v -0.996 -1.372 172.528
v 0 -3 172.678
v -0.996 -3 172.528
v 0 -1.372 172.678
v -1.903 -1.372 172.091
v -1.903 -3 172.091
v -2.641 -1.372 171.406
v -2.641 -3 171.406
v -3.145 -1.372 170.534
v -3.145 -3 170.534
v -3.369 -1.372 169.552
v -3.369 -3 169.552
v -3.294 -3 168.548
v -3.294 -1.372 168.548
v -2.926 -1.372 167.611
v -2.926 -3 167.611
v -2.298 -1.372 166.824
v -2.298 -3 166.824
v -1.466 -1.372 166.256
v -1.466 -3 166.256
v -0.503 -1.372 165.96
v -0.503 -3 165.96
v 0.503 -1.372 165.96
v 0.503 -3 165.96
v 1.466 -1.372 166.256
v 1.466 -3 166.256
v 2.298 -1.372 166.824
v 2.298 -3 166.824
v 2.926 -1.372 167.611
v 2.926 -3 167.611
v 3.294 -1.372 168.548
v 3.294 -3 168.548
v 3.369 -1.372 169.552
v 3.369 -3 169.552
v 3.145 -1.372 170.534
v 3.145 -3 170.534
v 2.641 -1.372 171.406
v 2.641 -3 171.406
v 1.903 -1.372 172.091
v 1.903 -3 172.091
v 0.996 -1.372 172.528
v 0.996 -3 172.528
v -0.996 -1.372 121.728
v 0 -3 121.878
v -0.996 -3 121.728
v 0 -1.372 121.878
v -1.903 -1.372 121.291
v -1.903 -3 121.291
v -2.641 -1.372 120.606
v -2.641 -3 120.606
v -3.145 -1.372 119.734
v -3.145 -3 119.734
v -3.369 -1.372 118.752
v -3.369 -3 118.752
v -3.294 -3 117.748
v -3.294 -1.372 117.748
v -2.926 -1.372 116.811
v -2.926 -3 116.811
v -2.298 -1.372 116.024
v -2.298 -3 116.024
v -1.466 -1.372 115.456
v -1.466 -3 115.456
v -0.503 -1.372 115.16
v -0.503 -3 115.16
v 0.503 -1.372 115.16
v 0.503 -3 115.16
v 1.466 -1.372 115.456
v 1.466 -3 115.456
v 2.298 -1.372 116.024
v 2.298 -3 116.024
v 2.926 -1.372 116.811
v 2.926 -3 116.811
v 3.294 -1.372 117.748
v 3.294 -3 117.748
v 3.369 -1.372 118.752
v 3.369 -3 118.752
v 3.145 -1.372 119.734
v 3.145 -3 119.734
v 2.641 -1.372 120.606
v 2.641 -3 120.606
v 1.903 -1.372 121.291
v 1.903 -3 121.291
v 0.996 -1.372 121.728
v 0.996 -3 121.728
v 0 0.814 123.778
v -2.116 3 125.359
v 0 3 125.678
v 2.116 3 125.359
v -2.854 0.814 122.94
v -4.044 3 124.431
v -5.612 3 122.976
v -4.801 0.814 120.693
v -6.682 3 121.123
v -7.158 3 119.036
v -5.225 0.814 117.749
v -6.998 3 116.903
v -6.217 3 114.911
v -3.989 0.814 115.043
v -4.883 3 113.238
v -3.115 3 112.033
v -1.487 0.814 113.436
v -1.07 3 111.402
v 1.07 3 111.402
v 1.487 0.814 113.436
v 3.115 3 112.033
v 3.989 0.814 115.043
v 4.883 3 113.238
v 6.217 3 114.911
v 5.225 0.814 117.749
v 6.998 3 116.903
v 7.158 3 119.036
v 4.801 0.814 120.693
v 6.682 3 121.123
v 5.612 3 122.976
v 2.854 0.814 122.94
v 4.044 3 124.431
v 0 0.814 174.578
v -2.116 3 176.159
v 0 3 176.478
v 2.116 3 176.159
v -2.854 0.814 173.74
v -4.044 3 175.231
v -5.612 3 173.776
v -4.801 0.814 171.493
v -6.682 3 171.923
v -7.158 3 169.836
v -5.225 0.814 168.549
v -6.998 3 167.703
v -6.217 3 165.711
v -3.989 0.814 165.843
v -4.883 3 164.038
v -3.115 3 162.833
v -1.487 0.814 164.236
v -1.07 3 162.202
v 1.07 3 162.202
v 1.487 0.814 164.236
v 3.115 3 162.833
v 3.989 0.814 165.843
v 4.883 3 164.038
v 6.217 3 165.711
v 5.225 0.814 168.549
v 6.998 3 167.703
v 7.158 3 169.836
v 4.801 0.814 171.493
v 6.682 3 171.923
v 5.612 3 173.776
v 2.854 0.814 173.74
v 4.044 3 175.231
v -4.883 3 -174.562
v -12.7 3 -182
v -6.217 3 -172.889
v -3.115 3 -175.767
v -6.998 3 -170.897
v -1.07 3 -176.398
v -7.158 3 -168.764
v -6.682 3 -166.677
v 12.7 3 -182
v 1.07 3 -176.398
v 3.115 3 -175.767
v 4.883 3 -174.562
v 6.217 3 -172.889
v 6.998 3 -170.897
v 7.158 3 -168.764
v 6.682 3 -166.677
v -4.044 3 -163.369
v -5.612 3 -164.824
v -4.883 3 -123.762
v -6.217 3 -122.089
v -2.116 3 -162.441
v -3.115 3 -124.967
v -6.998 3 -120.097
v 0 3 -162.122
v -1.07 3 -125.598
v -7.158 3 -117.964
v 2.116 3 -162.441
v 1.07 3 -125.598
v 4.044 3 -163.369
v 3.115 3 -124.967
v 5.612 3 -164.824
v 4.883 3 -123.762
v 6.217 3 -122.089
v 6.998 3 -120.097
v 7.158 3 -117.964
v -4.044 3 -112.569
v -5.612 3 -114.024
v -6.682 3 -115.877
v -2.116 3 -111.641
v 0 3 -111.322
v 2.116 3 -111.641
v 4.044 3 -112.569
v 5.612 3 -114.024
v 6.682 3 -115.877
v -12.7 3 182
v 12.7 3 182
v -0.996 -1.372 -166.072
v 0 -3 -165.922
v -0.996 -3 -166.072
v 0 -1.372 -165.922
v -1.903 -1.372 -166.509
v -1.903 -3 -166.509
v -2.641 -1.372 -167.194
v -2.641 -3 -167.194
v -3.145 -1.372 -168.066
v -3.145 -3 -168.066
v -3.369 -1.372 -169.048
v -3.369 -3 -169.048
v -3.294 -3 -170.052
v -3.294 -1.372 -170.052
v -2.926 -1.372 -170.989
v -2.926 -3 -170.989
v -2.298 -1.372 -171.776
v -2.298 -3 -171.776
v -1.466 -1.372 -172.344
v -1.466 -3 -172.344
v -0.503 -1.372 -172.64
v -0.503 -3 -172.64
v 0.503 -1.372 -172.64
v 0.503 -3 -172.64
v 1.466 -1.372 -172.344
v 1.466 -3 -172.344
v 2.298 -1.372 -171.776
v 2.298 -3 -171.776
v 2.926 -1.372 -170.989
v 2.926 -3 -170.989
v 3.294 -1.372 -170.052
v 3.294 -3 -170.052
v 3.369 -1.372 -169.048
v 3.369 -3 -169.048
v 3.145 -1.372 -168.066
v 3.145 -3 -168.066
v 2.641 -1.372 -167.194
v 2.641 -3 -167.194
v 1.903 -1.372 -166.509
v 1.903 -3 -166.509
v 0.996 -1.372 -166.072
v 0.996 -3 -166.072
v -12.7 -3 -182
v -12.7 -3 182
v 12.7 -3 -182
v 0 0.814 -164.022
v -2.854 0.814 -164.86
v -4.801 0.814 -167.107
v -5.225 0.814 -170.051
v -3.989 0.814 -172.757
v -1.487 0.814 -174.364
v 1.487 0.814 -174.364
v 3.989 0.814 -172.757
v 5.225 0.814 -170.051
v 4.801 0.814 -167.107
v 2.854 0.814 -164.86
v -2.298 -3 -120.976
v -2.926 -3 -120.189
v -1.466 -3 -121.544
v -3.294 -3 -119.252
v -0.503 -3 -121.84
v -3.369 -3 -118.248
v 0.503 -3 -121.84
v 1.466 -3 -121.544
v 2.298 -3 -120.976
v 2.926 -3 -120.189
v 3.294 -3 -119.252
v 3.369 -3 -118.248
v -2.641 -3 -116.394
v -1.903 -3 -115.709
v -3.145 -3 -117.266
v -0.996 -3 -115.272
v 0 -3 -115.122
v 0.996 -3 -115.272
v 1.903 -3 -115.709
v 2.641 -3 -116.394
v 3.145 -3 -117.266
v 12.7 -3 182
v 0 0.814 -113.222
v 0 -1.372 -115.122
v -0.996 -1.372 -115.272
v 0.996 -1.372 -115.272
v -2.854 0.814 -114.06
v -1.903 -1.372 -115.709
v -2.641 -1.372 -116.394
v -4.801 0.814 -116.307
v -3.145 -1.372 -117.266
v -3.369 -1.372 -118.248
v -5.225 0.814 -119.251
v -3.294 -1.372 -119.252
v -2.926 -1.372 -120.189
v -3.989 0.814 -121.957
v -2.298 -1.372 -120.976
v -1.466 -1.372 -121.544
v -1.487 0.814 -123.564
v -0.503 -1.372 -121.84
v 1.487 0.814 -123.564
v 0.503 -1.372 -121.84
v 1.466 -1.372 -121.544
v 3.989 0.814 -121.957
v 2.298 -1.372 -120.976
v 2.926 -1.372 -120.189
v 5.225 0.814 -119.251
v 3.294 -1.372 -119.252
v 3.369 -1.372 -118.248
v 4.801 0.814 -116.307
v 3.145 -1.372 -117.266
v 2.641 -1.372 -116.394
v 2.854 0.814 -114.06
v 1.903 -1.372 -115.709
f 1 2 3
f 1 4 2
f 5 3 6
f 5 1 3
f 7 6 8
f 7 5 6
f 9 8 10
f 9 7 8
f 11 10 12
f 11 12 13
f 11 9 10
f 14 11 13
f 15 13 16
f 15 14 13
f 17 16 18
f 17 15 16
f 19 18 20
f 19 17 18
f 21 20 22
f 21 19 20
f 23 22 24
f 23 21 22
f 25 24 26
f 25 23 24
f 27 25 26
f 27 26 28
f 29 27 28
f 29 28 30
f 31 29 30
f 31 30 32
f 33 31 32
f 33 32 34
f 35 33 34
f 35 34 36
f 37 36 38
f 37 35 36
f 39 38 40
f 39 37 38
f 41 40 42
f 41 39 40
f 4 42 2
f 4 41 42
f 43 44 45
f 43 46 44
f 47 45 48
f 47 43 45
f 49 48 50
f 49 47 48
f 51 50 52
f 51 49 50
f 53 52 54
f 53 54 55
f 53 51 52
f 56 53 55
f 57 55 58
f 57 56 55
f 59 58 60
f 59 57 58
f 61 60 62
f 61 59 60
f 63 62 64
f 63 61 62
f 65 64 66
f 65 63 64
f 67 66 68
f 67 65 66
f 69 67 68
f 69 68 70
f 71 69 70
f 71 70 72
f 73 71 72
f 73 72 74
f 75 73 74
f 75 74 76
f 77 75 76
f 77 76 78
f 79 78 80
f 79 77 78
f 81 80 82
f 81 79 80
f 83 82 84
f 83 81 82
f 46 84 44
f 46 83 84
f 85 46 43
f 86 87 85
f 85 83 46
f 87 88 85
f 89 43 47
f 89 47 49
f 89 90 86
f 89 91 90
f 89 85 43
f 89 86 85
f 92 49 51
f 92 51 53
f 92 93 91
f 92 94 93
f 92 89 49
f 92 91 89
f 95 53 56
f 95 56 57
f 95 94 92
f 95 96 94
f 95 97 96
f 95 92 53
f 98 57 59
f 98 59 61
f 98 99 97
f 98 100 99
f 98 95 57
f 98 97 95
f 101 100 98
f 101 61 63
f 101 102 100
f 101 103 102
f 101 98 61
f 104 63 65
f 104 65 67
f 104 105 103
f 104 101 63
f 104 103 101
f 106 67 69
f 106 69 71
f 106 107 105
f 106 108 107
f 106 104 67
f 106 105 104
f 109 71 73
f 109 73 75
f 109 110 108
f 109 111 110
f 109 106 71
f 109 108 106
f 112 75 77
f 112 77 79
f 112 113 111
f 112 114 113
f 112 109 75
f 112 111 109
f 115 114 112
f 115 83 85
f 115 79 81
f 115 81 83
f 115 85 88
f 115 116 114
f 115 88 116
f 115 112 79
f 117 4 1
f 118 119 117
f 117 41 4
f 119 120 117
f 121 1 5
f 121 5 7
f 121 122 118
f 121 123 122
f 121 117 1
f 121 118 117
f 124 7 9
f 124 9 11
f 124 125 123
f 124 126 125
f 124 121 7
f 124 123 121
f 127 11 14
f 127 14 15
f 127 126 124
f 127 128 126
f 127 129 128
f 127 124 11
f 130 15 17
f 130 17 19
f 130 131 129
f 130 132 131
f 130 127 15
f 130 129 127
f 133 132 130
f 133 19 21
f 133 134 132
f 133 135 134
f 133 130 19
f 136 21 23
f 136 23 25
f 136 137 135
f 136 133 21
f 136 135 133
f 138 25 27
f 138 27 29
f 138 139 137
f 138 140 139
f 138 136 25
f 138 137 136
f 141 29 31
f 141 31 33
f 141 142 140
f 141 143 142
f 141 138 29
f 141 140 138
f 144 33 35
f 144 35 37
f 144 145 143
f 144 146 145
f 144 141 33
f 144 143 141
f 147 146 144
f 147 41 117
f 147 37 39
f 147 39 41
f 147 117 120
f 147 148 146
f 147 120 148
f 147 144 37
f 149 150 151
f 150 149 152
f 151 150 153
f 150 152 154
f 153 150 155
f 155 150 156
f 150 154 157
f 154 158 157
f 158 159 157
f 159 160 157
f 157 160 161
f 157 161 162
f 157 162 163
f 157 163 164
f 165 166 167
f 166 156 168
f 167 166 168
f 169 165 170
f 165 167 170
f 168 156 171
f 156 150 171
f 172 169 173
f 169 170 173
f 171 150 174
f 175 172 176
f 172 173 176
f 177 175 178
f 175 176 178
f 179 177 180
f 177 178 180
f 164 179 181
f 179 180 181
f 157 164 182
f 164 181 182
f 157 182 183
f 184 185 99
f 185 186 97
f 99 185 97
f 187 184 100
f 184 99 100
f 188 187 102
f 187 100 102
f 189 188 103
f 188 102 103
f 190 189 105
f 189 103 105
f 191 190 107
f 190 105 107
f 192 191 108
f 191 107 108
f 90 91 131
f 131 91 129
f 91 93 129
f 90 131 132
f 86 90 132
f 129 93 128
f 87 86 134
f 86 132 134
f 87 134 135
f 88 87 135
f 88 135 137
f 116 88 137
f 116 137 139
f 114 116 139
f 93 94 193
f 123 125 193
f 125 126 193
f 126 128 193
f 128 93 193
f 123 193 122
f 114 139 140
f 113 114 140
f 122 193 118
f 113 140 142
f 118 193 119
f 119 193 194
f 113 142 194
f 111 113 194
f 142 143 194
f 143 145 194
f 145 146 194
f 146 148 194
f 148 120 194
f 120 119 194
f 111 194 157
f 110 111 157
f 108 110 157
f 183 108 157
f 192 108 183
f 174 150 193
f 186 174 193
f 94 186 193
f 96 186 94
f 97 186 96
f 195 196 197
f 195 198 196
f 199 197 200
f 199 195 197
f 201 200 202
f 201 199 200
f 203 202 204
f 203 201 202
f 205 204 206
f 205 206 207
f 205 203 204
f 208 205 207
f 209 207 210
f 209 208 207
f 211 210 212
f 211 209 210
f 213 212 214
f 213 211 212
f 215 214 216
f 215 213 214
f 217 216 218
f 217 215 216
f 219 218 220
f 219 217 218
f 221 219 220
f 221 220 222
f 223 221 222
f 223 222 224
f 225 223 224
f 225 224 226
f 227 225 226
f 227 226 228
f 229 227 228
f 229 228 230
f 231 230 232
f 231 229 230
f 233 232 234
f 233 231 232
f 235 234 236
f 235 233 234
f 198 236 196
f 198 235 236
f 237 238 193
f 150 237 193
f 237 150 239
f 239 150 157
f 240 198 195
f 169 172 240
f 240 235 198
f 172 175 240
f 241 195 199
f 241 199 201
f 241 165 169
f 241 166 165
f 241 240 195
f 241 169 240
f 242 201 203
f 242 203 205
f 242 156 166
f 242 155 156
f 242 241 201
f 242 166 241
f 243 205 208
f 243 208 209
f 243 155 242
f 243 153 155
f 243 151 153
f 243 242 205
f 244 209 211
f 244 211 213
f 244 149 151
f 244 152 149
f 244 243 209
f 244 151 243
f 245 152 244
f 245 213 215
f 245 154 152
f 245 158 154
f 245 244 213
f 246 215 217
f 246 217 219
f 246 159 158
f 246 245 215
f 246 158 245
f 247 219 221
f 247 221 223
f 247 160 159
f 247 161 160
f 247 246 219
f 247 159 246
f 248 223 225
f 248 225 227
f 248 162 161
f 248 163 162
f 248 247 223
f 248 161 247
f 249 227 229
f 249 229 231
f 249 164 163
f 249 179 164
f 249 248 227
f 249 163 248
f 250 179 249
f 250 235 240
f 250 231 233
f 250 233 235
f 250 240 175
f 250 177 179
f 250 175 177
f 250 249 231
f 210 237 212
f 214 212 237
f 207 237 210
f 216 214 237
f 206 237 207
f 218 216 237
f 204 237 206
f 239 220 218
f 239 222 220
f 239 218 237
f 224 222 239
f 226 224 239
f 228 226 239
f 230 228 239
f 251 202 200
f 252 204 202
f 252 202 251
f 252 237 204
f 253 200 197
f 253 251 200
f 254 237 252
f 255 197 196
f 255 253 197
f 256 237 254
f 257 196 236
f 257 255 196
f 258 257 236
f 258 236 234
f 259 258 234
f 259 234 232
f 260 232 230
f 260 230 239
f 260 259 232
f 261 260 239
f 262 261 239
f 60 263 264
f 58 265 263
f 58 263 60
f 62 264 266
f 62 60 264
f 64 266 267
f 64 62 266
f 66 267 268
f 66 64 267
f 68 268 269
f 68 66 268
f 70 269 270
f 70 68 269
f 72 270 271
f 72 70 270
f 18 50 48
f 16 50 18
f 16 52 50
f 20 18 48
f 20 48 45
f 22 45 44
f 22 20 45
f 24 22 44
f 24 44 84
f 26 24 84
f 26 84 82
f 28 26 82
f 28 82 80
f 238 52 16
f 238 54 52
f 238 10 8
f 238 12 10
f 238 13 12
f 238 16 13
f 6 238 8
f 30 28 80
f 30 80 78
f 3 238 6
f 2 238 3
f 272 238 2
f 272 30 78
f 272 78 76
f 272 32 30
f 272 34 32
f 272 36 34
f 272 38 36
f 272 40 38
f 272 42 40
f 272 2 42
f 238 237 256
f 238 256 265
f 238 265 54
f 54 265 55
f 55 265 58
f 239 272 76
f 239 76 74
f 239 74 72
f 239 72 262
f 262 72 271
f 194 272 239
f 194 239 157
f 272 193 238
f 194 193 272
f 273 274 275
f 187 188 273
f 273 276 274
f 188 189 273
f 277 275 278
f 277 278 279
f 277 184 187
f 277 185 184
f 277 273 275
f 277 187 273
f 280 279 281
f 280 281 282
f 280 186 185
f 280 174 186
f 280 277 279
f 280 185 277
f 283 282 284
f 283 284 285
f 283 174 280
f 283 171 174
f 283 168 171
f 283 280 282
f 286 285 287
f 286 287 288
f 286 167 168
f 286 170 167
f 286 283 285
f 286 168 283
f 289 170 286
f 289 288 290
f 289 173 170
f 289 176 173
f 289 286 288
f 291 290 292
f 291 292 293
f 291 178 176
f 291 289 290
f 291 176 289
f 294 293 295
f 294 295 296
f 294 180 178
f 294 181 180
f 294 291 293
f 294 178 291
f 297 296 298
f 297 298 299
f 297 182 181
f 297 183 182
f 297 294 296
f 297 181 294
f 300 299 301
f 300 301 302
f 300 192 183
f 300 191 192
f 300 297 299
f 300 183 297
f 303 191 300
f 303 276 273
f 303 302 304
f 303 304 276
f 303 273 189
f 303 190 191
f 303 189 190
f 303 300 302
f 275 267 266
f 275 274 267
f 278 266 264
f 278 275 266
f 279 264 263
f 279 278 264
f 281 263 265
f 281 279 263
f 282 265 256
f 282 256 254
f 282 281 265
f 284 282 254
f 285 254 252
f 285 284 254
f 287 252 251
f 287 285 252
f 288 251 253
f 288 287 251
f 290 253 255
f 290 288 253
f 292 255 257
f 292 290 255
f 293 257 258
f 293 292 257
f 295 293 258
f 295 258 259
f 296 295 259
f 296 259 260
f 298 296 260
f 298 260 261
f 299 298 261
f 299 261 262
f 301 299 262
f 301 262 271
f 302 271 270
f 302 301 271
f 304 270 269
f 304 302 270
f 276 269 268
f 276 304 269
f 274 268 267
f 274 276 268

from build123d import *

# Parameters (mm, degrees)
SKETCH3_W                                    = 25.4
SKETCH3_H                                    = 6
BOSS_EXTRUDE1_DEPTH                          = 182
CSK_FOR_1_4_FLAT_HEAD_SOCKET_CAP_SCR_2_COUNT = 2
CSK_FOR_1_4_FLAT_HEAD_SOCKET_CAP_SCR_2_PITCH = 338.6
CSK_FOR_1_4_FLAT_HEAD_SOCKET_CAP_SCR_3_COUNT = 2
CSK_FOR_1_4_FLAT_HEAD_SOCKET_CAP_SCR_3_PITCH = 50.8
CSK_FOR_1_4_FLAT_HEAD_SOCKET_CAP_SCR_4_COUNT = 2
CSK_FOR_1_4_FLAT_HEAD_SOCKET_CAP_SCR_4_PITCH = 287.8


with BuildPart() as part:
    # Sketch3 → Boss-Extrude1 (new body, symmetric)
    with BuildSketch(Plane.XY):
        Rectangle(SKETCH3_W, SKETCH3_H)
    extrude(amount=BOSS_EXTRUDE1_DEPTH, both=True)

    # Sketch8 → CSK for 1/4 Flat Head Socket Cap Screw1 (revolve, cut)
    with BuildSketch(Plane(origin=(0, 3, -169.3), x_dir=(0, 0, 1), z_dir=(1, 0, 0))):
        Polygon((0, 0), (0, 6), (3.3782, 6), (3.3782, 4.371566521), (7.1783448, 0), align=None)
    csk_for_1_4_flat_head_socket_cap_screw1 = revolve(axis=Axis((0, 9.35, -169.3), (0, -1, 0)), mode=Mode.SUBTRACT)

    # CSK for 1_4 Flat Head Socket Cap Scr 2: CSK for 1/4 Flat Head Socket Cap Screw1 ×2
    with Locations(*[(0, 0, i * CSK_FOR_1_4_FLAT_HEAD_SOCKET_CAP_SCR_2_PITCH) for i in range(1, CSK_FOR_1_4_FLAT_HEAD_SOCKET_CAP_SCR_2_COUNT)]):
        add(csk_for_1_4_flat_head_socket_cap_screw1, mode=Mode.SUBTRACT)

    # CSK for 1_4 Flat Head Socket Cap Scr 3: CSK for 1/4 Flat Head Socket Cap Screw1 ×2
    with Locations(*[(0, 0, i * CSK_FOR_1_4_FLAT_HEAD_SOCKET_CAP_SCR_3_PITCH) for i in range(1, CSK_FOR_1_4_FLAT_HEAD_SOCKET_CAP_SCR_3_COUNT)]):
        add(csk_for_1_4_flat_head_socket_cap_screw1, mode=Mode.SUBTRACT)

    # CSK for 1_4 Flat Head Socket Cap Scr 4: CSK for 1/4 Flat Head Socket Cap Screw1 ×2
    with Locations(*[(0, 0, i * CSK_FOR_1_4_FLAT_HEAD_SOCKET_CAP_SCR_4_PITCH) for i in range(1, CSK_FOR_1_4_FLAT_HEAD_SOCKET_CAP_SCR_4_COUNT)]):
        add(csk_for_1_4_flat_head_socket_cap_screw1, mode=Mode.SUBTRACT)


solid = part.part
